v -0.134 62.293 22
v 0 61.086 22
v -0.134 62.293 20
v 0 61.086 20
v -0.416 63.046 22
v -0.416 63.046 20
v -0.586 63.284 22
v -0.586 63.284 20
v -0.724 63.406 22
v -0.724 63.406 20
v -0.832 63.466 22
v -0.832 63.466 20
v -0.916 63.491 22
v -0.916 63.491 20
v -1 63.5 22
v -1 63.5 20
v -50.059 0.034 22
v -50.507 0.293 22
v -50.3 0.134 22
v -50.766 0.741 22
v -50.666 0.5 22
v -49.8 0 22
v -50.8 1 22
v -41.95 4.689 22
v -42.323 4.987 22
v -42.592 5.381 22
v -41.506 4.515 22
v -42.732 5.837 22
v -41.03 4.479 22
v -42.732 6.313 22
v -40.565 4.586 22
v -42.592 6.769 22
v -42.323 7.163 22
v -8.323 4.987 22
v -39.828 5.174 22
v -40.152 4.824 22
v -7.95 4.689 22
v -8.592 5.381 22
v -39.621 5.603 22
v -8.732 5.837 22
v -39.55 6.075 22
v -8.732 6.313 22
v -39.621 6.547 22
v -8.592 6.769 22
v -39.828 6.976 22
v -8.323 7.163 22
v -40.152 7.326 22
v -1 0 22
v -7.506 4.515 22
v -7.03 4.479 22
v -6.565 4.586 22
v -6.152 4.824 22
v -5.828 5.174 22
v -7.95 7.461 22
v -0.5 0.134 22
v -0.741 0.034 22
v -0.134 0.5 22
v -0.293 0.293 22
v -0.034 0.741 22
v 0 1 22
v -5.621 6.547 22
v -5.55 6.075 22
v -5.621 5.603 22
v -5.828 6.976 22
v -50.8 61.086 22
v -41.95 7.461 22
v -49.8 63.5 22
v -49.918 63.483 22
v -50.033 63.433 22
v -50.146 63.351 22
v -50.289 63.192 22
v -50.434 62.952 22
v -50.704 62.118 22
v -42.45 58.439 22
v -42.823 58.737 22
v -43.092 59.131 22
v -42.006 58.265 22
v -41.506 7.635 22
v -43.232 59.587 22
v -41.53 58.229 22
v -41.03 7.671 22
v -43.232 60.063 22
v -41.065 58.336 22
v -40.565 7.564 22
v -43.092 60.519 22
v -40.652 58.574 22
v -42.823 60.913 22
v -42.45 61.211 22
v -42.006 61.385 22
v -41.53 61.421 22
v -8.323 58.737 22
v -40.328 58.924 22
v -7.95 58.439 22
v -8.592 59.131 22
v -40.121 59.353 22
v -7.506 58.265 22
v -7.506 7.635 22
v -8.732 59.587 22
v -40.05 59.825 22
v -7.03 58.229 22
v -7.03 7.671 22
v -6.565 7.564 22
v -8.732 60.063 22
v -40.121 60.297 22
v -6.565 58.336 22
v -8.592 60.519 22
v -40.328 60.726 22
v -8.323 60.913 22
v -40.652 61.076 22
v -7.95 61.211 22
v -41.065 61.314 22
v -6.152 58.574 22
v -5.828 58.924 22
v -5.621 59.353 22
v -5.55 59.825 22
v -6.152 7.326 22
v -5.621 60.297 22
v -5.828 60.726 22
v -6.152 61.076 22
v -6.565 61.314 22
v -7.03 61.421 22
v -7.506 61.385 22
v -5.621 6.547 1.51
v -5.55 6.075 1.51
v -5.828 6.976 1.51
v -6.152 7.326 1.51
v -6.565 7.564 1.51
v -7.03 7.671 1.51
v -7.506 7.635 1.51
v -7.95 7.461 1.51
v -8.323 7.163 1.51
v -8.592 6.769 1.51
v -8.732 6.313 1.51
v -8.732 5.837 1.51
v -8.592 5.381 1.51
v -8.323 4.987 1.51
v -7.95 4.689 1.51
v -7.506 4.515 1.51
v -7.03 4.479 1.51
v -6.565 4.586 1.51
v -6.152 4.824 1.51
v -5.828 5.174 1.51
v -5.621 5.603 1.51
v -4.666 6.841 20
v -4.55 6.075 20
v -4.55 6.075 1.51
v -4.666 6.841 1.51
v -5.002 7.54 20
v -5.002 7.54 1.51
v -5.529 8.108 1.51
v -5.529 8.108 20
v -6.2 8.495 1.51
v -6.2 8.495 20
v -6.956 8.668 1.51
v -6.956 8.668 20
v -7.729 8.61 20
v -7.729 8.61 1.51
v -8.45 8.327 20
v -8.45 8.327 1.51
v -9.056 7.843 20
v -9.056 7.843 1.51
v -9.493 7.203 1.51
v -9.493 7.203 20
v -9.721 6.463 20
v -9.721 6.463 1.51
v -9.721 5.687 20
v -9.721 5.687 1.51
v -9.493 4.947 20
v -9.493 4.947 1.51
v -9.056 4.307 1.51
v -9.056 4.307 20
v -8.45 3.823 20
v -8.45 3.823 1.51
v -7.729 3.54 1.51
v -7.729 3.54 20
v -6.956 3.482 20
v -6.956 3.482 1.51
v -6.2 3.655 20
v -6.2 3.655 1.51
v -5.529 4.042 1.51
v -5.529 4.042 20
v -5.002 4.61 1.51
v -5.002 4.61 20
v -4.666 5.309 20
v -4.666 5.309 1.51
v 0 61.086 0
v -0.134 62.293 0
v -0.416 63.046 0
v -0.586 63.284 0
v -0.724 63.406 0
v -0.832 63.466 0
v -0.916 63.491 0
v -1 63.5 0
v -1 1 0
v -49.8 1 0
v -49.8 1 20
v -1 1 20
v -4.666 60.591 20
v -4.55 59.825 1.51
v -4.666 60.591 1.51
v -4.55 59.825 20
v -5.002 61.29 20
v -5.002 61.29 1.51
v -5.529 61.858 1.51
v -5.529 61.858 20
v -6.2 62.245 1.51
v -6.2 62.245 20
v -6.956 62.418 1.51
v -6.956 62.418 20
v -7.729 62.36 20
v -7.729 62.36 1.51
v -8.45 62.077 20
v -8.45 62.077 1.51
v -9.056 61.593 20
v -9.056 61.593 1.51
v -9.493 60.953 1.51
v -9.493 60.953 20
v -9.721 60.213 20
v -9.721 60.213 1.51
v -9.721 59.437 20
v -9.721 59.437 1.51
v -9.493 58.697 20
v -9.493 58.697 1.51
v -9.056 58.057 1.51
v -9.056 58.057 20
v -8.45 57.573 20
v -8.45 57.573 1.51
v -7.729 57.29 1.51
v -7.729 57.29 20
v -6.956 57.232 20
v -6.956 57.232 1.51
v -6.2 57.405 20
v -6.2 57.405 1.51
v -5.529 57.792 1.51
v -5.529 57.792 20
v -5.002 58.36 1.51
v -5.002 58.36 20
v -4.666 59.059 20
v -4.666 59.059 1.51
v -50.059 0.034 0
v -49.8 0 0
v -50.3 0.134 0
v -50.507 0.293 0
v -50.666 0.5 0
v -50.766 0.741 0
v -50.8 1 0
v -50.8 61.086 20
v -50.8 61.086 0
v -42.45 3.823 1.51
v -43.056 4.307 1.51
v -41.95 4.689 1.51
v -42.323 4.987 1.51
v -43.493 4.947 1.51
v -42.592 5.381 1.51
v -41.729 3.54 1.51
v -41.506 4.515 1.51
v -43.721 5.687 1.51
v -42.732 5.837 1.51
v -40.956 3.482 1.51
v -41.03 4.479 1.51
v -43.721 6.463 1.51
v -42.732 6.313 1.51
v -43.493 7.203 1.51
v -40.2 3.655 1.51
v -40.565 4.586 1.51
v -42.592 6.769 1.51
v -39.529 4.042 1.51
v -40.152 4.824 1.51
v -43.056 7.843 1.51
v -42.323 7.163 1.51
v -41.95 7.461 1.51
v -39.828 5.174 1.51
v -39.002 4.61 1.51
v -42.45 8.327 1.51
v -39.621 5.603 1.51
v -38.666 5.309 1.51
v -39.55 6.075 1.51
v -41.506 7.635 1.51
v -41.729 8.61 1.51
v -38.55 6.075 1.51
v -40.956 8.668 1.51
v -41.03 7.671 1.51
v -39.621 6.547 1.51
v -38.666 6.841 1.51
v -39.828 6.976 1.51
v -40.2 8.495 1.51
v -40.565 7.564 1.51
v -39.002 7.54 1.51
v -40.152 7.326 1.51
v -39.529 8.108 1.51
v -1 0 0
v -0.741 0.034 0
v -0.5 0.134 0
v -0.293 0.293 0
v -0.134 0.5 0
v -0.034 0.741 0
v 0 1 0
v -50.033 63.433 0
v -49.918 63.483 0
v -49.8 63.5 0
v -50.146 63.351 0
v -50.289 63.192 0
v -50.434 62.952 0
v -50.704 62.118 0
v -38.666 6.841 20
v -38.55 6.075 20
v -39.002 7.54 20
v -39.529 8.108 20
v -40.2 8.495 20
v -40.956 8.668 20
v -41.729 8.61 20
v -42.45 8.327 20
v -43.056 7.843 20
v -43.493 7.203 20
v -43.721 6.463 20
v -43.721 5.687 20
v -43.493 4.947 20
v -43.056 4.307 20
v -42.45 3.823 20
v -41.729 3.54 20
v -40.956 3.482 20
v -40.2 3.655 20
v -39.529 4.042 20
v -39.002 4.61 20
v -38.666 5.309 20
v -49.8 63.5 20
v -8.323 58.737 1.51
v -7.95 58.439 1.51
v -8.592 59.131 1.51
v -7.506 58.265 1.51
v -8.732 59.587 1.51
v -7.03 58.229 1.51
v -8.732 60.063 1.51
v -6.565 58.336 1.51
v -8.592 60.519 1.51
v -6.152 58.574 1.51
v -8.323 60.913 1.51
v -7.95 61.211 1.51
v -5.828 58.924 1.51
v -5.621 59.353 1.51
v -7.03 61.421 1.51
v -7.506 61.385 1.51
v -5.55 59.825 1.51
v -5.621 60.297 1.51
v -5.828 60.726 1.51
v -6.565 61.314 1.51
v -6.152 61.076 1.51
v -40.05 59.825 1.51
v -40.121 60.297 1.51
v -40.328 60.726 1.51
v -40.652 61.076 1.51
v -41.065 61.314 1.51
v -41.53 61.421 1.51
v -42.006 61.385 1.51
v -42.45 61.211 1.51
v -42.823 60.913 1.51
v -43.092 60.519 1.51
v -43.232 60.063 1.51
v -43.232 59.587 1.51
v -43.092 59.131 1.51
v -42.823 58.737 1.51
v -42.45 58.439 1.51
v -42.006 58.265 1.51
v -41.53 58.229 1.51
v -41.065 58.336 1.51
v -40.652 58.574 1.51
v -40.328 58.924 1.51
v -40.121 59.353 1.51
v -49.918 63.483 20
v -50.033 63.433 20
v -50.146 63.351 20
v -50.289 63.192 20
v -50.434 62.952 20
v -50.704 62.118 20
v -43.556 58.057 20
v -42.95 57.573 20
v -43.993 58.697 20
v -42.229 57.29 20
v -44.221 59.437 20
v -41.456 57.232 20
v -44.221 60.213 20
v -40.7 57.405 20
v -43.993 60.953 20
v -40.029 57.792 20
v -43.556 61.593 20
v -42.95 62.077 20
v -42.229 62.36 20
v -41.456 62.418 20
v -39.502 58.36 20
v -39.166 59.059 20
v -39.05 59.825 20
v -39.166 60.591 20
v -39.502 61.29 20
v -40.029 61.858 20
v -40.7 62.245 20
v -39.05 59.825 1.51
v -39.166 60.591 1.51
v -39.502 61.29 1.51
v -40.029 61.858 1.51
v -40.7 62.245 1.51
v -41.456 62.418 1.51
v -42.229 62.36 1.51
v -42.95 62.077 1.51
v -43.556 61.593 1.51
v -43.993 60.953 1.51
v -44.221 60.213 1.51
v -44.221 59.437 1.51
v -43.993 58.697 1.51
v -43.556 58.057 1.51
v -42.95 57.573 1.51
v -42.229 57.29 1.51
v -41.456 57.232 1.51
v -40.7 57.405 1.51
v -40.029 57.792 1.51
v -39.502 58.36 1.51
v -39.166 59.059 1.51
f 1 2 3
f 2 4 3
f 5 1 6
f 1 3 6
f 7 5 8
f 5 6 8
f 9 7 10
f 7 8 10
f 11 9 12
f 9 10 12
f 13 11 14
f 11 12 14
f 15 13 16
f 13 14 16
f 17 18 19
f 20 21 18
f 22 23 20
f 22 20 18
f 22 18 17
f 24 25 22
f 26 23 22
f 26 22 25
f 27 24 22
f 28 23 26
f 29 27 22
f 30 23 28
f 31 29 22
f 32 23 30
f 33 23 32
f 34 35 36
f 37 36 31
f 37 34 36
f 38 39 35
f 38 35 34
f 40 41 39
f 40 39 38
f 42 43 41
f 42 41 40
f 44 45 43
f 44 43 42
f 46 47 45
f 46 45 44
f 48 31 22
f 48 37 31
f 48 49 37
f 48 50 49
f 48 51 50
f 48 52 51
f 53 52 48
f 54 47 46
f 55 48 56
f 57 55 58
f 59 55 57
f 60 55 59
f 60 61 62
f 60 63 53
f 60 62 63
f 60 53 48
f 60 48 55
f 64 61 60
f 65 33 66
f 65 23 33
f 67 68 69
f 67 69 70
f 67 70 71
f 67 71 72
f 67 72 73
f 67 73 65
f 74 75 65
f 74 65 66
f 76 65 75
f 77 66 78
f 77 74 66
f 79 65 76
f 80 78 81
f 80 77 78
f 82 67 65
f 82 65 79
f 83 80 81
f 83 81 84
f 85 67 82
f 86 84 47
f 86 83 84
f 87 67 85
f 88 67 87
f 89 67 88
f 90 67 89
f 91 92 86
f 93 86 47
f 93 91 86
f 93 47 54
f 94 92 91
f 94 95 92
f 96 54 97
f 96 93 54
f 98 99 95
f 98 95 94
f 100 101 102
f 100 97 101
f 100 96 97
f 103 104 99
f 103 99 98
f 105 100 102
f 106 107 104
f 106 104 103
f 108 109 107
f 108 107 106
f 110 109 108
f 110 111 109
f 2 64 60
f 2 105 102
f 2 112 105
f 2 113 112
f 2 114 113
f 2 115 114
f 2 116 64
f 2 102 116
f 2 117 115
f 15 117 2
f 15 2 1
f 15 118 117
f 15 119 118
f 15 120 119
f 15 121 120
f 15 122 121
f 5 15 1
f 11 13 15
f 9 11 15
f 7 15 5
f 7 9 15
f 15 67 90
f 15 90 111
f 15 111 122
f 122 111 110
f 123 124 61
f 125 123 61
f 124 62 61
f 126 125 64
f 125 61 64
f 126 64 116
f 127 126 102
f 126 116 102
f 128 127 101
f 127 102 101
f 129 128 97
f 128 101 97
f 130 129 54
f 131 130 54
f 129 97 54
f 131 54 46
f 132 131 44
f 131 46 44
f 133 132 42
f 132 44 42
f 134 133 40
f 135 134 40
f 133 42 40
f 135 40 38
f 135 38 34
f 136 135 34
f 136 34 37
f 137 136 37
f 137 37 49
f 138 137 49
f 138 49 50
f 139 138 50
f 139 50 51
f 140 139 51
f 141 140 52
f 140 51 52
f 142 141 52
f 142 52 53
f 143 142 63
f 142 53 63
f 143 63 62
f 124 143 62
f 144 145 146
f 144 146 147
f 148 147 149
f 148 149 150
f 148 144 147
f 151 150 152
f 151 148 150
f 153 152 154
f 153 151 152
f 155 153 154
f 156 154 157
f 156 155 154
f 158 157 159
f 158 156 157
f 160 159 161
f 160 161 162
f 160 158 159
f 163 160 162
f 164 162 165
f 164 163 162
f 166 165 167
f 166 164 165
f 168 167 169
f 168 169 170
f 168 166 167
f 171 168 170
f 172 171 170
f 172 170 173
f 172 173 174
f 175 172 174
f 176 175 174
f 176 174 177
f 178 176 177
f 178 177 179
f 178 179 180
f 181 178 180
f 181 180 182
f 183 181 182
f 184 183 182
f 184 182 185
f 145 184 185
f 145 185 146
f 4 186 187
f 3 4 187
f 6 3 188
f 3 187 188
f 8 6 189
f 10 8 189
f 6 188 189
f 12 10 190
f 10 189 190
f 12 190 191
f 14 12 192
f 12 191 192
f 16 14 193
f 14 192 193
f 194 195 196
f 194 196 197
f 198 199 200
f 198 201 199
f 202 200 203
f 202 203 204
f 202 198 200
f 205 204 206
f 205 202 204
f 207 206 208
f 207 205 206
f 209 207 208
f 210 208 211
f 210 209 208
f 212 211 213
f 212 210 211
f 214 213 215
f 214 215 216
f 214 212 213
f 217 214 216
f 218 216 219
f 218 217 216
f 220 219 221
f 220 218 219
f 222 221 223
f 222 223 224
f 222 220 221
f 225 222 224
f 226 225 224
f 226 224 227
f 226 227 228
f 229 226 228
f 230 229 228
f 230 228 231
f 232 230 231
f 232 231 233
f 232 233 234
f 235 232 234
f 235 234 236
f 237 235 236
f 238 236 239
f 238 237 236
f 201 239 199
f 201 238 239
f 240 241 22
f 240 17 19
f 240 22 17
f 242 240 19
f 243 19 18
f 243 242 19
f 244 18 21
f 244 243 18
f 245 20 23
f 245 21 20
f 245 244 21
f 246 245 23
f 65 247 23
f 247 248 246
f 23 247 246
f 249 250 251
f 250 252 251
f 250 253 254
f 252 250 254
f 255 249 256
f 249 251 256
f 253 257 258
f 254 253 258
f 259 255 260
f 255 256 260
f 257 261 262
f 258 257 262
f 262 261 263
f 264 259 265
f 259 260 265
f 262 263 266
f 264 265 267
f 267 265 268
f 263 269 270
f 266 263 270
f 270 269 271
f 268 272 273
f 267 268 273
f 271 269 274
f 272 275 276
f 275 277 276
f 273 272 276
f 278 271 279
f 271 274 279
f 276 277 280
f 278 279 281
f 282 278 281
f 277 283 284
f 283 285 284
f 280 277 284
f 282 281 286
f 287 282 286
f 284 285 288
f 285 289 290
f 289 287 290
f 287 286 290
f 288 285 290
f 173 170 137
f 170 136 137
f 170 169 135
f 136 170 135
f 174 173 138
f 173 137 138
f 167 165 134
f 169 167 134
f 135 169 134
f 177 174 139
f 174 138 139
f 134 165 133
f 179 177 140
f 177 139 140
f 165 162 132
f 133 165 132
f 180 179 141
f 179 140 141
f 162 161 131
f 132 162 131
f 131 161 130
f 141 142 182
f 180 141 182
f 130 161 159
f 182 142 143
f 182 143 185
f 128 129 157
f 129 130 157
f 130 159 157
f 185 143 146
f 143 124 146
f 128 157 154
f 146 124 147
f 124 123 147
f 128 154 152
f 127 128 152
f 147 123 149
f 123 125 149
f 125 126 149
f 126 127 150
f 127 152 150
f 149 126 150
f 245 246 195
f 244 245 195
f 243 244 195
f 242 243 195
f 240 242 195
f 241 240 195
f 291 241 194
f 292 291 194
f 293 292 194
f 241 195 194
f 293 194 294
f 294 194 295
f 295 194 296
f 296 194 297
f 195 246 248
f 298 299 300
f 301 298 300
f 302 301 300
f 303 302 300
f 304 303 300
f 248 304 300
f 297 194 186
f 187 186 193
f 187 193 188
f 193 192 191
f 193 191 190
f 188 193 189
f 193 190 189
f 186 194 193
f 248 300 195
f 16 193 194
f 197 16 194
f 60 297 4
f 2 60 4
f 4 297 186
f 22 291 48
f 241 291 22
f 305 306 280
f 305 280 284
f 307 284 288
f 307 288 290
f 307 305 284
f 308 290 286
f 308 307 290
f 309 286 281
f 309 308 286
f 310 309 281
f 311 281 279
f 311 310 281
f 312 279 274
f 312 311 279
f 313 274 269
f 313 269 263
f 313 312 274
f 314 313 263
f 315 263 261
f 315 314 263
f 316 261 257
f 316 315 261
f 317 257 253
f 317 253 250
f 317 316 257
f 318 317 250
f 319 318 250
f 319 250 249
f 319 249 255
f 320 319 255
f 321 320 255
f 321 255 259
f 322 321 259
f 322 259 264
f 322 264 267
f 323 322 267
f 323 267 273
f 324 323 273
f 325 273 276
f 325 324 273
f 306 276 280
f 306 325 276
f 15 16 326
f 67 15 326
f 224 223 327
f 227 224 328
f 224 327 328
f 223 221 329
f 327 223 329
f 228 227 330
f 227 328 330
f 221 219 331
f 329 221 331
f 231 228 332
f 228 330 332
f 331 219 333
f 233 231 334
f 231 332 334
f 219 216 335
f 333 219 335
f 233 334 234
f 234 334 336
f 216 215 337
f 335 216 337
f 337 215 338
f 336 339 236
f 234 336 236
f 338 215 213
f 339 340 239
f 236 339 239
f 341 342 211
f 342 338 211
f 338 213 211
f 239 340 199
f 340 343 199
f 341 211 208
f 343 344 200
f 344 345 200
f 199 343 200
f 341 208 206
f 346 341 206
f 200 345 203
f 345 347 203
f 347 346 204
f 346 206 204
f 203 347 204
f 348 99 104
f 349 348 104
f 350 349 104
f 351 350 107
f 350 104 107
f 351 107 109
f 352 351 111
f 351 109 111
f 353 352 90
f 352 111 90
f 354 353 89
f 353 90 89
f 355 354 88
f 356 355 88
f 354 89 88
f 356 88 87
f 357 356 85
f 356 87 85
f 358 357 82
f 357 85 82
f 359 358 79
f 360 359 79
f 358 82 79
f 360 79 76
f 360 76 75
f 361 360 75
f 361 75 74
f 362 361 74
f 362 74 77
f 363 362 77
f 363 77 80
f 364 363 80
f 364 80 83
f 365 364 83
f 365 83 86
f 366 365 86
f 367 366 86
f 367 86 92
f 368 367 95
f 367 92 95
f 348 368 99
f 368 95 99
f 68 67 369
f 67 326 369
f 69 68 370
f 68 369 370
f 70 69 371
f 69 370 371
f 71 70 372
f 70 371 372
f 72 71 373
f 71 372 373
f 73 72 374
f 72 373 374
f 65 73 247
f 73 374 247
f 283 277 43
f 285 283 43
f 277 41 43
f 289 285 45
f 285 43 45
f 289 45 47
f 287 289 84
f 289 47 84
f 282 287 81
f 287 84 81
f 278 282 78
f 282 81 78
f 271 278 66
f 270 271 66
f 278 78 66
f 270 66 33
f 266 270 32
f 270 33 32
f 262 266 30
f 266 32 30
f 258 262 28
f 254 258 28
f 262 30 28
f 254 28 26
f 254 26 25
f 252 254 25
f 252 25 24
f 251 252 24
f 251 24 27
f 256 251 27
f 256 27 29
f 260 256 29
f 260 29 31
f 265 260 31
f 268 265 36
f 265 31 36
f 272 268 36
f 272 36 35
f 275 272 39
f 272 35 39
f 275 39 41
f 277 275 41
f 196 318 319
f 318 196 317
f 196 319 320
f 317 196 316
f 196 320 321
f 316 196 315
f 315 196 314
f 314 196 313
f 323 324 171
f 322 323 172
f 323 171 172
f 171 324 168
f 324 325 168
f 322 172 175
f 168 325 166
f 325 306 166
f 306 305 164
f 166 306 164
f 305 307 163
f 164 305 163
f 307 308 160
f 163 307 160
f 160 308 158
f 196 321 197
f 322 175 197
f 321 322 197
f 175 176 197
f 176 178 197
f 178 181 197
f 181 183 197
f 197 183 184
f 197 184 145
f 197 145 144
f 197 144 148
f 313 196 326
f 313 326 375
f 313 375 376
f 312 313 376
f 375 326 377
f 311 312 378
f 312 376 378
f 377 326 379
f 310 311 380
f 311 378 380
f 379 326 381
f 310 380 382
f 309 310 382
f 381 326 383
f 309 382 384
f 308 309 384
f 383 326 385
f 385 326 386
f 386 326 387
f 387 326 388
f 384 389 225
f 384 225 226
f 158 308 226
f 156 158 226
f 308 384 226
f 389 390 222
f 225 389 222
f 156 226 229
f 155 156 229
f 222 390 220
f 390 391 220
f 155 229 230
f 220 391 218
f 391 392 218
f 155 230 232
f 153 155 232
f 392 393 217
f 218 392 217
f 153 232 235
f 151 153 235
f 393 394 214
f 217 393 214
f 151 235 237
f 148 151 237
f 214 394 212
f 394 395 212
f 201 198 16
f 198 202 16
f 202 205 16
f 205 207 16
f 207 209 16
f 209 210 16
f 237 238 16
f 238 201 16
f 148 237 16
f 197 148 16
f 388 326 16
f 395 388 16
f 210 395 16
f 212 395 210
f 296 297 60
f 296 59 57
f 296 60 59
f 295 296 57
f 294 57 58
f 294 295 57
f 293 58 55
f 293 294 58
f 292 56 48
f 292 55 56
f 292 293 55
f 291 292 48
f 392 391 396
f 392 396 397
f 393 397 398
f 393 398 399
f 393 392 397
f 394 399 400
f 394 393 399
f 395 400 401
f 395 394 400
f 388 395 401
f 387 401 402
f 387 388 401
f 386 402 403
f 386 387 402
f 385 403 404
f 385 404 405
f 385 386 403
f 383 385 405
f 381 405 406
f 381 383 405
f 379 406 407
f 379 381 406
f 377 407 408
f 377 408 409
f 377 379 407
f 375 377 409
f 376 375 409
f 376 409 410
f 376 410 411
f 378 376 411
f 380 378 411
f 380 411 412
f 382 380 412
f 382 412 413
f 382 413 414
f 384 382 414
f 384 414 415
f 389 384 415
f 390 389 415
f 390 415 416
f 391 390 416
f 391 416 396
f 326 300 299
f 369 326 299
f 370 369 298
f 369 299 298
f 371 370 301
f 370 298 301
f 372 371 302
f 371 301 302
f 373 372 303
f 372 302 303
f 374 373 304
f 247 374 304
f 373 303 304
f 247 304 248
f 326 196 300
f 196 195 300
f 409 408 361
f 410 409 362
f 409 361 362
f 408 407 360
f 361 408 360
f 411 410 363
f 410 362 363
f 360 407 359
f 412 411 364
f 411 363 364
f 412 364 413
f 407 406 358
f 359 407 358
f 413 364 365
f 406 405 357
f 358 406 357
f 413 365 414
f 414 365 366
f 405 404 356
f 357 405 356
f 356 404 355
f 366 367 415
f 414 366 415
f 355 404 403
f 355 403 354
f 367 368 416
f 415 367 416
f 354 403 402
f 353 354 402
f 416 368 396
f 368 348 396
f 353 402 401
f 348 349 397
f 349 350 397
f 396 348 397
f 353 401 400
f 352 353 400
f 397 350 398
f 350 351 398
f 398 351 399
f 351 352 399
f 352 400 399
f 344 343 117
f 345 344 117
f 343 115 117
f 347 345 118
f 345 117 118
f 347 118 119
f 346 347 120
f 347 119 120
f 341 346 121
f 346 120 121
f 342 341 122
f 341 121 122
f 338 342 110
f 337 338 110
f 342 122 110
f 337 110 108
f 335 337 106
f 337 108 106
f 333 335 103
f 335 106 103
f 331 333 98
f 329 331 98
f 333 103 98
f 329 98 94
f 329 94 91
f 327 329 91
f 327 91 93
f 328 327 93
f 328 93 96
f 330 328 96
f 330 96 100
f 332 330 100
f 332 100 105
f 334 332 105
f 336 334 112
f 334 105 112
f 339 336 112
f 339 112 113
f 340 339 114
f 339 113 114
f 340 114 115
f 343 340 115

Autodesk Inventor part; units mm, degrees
ref_plane "YZ Plane" through (0, 0, 0) normal (1, 0, 0) x (0, 1, 0)
ref_plane "XZ Plane" through (0, 0, 0) normal (0, 1, 0) x (-1, 0, 0)
sketch "Sketch1" plane through (0, 0, 0) normal (0, 0, 1) x (1, 0, 0)
  circle A0 centre (-41.65, 59.825) radius 1.6 projected
  circle A1 centre (-41.15, 6.075) radius 1.6 projected
  circle A2 centre (-7.15, 59.825) radius 1.6 projected
  circle A3 centre (-7.15, 6.075) radius 1.6 projected
  line L0 (-1, 63.5) -> (-1, 0) projected
  line L1 (-1, 63.5) -> (-49.8, 63.5) projected
  line L2 (-49.8, 0) -> (-49.8, 63.5) projected
  line L3 (-1, 0) -> (-49.8, 0) projected
  ellipse E0 centre (-49.8, 61.0858) end of major axis (-49.8, 63.5) minor radius 1 (-49.8, 63.5) -> (-50.8, 61.0858) ccw projected
  line L4 (-50.8, 61.0858) -> (-50.8, 1) projected
  arc A4 (-50.8, 1) -> (-49.8, 0) centre (-49.8, 1) ccw projected
  arc A5 (-1, 0) -> (0, 1) centre (-1, 1) ccw projected
  line L5 (0, 1) -> (0, 61.0858) projected
  ellipse E1 centre (-1, 61.0858) end of major axis (-1, 58.6716) minor radius 1 (0, 61.0858) -> (-1, 63.5) ccw projected
  line L6 (-48.9, 5.825) -> (-48.9, 59.5) projected
  arc A6 (-44.9, 63.5) -> (-48.9, 59.5) centre (-44.9, 59.5) ccw projected
  arc A7 (-1.9, 59.5) -> (-5.9, 63.5) centre (-5.9, 59.5) ccw projected
  line L7 (-1.9, 59.5) -> (-1.9, 5.825) projected
  arc A8 (-48.9, 5.825) -> (-44.9, 1.825) centre (-44.9, 5.825) ccw projected
  line L8 (-5.9, 1.825) -> (-44.9, 1.825) projected
  arc A9 (-5.9, 1.825) -> (-1.9, 5.825) centre (-5.9, 5.825) ccw projected
  line L9 (-49.8, 1) -> (-1, 1)
  point P0 (0, 0)
extrude "Extrusion1" add sketch "Sketch1" along normal blind 20 contours E1 L5 A5 L0 | L0 L3 L2 L9 | L2 A4 L4 E0
sketch "Sketch2" plane through (0, 0, 20) normal (0, 0, 1) x (1, 0, 0)
  line L0 (-1, 63.5) -> (-49.8, 63.5) projected
  ellipse E0 centre (-49.8, 61.0858) end of major axis (-49.8, 63.5) minor radius 1 (-49.8, 63.5) -> (-50.8, 61.0858) ccw projected
  line L1 (-49.8, 0) -> (-1, 0) projected
  arc A0 (-1, 0) -> (0, 1) centre (-1, 1) ccw projected
  line L2 (0, 1) -> (0, 61.0858) projected
  ellipse E1 centre (-1, 61.0858) end of major axis (-1, 58.6716) minor radius 1 (0, 61.0858) -> (-1, 63.5) ccw projected
  line L3 (-1, 63.5) -> (-1, 1) projected
  line L4 (-1, 1) -> (-49.8, 1) projected
  line L5 (-49.8, 1) -> (-49.8, 63.5) projected
  ellipse E2 centre (-49.8, 61.0858) end of major axis (-49.8, 63.5) minor radius 1 (-49.8, 63.5) -> (-50.8, 61.0858) ccw projected
  line L6 (-50.8, 61.0858) -> (-50.8, 1) projected
  arc A1 (-50.8, 1) -> (-49.8, 0) centre (-49.8, 1) ccw projected
  arc A2 (-44.9, 63.5) -> (-48.9, 59.5) centre (-44.9, 59.5) ccw projected
  arc A3 (-1.9, 59.5) -> (-5.9, 63.5) centre (-5.9, 59.5) ccw projected
  line L7 (-48.9, 59.5) -> (-49.8, 59.5)
  line L8 (-1.9, 59.5) -> (-1, 59.5)
  line L9 (-1.9, 59.5) -> (-48.9, 59.5)
  line L10 (-5.9, 1.825) -> (-44.9, 1.825) projected
  line L11 (-44.9, 1.825) -> (-49.8, 1.825)
  line L12 (-5.9, 1.825) -> (-1, 1.825)
  point P0 (0, 0)
extrude "Extrusion2" add sketch "Sketch2" along normal blind 2
sketch "Sketch3" plane through (0, 0, 22) normal (0, 0, 1) x (1, 0, 0)
  circle A0 centre (-41.65, 59.825) radius 1.6 projected
  circle A1 centre (-7.15, 59.825) radius 1.6 projected
  circle A2 centre (-7.15, 6.075) radius 1.6 projected
  circle A3 centre (-41.15, 6.075) radius 1.6 projected
  point P0 (0, 0)
extrude "Extrusion3" cut sketch "Sketch3" against normal through all
ref_plane "Work Plane1" through (-49.495, 1.3716, 1.51) normal (0, 0, 1) x (1, 0, 0)
sketch "Sketch4" plane through (0, 0, 22) normal (0, 0, 1) x (1, 0, 0)
  circle A0 centre (-41.65, 59.825) radius 1.6 projected
  circle A1 centre (-41.15, 6.075) radius 1.6 projected
  circle A2 centre (-7.15, 6.075) radius 1.6 projected
  circle A3 centre (-7.15, 59.825) radius 1.6 projected
  circle A4 centre (-41.65, 59.825) radius 2.6
  circle A5 centre (-7.15, 59.825) radius 2.6
  circle A6 centre (-7.15, 6.075) radius 2.6
  circle A7 centre (-41.15, 6.075) radius 2.6
  point P0 (0, 0)
  dimension "d10" = 1
  dimension "d11" = 1
  dimension "d12" = 1
  dimension "d13" = 1
extrude "Extrusion4" add sketch "Sketch4" against normal up to surface (20.49 mm away)
properties part number "case-top"
